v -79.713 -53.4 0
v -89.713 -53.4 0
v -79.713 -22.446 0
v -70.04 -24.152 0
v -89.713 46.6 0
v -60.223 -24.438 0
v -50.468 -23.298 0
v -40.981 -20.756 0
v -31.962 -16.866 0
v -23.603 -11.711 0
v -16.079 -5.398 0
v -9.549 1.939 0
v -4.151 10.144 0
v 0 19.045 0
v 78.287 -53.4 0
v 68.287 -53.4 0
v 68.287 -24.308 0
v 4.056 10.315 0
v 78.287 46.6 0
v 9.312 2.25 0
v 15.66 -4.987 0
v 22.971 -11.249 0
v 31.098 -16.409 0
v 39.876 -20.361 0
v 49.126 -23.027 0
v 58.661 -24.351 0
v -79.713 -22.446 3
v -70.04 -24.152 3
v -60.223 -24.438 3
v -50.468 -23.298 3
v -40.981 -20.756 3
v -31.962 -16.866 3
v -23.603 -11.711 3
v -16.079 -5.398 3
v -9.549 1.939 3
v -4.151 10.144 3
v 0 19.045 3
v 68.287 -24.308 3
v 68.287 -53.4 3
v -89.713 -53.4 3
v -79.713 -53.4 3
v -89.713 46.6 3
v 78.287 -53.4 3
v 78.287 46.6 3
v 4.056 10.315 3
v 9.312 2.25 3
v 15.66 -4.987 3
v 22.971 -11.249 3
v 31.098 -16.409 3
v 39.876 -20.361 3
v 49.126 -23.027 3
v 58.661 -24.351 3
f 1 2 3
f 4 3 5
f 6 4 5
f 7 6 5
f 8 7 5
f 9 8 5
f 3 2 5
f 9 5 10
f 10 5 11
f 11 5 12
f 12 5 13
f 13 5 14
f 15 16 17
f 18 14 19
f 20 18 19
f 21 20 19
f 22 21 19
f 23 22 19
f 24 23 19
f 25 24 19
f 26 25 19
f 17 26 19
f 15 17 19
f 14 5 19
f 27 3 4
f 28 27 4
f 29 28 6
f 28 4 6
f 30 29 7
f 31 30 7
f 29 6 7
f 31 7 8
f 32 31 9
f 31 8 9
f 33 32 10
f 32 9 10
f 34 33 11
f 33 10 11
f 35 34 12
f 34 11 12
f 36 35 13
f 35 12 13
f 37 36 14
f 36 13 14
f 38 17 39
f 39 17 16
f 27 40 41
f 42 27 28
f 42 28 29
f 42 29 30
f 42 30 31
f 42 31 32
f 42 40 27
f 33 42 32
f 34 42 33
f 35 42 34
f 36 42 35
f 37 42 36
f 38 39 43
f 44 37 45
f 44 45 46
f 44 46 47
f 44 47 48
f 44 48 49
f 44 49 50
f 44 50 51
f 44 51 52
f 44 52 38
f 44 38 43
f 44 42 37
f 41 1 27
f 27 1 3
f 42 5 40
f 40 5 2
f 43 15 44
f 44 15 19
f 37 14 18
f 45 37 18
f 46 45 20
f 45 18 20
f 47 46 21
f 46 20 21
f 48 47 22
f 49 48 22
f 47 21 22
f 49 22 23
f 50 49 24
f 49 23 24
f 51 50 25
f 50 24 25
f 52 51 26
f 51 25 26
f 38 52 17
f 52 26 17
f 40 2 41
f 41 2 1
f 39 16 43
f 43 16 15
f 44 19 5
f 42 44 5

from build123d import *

# Parameters (mm, degrees)
SALIENTE_EXTRUIR1_DEPTH = 3


with BuildPart() as part:
    # Croquis1 → Saliente-Extruir1 (new body)
    with BuildSketch(Plane.XY):
        with BuildLine():
            Line((68.287228231, -24.307780687), (68.287228231, -43.400459387))
            Line((68.287228231, -43.400459387), (68.287228231, -53.400459387))
            Line((68.287228231, -53.400459387), (78.287228231, -53.400459387))
            Line((78.287228231, -53.400459387), (78.287228231, 46.599540613))
            Line((78.287228231, 46.599540613), (-89.712771769, 46.599540613))
            Line((-89.712771769, 46.599540613), (-89.712771769, -53.400459387))
            Line((-89.712771769, -53.400459387), (-79.712771769, -53.400459387))
            Line((-79.712771769, -53.400459387), (-79.712771769, -43.400459387))
            Line((-79.712771769, -43.400459387), (-79.712771769, -22.445940721))
            ThreePointArc((-79.712771769, -22.445940721), (-31.962424833, -16.866365463), (0, 19.045062959))
            ThreePointArc((0, 19.045062959), (26.942806363, -13.973710623), (68.287228231, -24.307780687))
        make_face()
    extrude(amount=SALIENTE_EXTRUIR1_DEPTH)


solid = part.part
